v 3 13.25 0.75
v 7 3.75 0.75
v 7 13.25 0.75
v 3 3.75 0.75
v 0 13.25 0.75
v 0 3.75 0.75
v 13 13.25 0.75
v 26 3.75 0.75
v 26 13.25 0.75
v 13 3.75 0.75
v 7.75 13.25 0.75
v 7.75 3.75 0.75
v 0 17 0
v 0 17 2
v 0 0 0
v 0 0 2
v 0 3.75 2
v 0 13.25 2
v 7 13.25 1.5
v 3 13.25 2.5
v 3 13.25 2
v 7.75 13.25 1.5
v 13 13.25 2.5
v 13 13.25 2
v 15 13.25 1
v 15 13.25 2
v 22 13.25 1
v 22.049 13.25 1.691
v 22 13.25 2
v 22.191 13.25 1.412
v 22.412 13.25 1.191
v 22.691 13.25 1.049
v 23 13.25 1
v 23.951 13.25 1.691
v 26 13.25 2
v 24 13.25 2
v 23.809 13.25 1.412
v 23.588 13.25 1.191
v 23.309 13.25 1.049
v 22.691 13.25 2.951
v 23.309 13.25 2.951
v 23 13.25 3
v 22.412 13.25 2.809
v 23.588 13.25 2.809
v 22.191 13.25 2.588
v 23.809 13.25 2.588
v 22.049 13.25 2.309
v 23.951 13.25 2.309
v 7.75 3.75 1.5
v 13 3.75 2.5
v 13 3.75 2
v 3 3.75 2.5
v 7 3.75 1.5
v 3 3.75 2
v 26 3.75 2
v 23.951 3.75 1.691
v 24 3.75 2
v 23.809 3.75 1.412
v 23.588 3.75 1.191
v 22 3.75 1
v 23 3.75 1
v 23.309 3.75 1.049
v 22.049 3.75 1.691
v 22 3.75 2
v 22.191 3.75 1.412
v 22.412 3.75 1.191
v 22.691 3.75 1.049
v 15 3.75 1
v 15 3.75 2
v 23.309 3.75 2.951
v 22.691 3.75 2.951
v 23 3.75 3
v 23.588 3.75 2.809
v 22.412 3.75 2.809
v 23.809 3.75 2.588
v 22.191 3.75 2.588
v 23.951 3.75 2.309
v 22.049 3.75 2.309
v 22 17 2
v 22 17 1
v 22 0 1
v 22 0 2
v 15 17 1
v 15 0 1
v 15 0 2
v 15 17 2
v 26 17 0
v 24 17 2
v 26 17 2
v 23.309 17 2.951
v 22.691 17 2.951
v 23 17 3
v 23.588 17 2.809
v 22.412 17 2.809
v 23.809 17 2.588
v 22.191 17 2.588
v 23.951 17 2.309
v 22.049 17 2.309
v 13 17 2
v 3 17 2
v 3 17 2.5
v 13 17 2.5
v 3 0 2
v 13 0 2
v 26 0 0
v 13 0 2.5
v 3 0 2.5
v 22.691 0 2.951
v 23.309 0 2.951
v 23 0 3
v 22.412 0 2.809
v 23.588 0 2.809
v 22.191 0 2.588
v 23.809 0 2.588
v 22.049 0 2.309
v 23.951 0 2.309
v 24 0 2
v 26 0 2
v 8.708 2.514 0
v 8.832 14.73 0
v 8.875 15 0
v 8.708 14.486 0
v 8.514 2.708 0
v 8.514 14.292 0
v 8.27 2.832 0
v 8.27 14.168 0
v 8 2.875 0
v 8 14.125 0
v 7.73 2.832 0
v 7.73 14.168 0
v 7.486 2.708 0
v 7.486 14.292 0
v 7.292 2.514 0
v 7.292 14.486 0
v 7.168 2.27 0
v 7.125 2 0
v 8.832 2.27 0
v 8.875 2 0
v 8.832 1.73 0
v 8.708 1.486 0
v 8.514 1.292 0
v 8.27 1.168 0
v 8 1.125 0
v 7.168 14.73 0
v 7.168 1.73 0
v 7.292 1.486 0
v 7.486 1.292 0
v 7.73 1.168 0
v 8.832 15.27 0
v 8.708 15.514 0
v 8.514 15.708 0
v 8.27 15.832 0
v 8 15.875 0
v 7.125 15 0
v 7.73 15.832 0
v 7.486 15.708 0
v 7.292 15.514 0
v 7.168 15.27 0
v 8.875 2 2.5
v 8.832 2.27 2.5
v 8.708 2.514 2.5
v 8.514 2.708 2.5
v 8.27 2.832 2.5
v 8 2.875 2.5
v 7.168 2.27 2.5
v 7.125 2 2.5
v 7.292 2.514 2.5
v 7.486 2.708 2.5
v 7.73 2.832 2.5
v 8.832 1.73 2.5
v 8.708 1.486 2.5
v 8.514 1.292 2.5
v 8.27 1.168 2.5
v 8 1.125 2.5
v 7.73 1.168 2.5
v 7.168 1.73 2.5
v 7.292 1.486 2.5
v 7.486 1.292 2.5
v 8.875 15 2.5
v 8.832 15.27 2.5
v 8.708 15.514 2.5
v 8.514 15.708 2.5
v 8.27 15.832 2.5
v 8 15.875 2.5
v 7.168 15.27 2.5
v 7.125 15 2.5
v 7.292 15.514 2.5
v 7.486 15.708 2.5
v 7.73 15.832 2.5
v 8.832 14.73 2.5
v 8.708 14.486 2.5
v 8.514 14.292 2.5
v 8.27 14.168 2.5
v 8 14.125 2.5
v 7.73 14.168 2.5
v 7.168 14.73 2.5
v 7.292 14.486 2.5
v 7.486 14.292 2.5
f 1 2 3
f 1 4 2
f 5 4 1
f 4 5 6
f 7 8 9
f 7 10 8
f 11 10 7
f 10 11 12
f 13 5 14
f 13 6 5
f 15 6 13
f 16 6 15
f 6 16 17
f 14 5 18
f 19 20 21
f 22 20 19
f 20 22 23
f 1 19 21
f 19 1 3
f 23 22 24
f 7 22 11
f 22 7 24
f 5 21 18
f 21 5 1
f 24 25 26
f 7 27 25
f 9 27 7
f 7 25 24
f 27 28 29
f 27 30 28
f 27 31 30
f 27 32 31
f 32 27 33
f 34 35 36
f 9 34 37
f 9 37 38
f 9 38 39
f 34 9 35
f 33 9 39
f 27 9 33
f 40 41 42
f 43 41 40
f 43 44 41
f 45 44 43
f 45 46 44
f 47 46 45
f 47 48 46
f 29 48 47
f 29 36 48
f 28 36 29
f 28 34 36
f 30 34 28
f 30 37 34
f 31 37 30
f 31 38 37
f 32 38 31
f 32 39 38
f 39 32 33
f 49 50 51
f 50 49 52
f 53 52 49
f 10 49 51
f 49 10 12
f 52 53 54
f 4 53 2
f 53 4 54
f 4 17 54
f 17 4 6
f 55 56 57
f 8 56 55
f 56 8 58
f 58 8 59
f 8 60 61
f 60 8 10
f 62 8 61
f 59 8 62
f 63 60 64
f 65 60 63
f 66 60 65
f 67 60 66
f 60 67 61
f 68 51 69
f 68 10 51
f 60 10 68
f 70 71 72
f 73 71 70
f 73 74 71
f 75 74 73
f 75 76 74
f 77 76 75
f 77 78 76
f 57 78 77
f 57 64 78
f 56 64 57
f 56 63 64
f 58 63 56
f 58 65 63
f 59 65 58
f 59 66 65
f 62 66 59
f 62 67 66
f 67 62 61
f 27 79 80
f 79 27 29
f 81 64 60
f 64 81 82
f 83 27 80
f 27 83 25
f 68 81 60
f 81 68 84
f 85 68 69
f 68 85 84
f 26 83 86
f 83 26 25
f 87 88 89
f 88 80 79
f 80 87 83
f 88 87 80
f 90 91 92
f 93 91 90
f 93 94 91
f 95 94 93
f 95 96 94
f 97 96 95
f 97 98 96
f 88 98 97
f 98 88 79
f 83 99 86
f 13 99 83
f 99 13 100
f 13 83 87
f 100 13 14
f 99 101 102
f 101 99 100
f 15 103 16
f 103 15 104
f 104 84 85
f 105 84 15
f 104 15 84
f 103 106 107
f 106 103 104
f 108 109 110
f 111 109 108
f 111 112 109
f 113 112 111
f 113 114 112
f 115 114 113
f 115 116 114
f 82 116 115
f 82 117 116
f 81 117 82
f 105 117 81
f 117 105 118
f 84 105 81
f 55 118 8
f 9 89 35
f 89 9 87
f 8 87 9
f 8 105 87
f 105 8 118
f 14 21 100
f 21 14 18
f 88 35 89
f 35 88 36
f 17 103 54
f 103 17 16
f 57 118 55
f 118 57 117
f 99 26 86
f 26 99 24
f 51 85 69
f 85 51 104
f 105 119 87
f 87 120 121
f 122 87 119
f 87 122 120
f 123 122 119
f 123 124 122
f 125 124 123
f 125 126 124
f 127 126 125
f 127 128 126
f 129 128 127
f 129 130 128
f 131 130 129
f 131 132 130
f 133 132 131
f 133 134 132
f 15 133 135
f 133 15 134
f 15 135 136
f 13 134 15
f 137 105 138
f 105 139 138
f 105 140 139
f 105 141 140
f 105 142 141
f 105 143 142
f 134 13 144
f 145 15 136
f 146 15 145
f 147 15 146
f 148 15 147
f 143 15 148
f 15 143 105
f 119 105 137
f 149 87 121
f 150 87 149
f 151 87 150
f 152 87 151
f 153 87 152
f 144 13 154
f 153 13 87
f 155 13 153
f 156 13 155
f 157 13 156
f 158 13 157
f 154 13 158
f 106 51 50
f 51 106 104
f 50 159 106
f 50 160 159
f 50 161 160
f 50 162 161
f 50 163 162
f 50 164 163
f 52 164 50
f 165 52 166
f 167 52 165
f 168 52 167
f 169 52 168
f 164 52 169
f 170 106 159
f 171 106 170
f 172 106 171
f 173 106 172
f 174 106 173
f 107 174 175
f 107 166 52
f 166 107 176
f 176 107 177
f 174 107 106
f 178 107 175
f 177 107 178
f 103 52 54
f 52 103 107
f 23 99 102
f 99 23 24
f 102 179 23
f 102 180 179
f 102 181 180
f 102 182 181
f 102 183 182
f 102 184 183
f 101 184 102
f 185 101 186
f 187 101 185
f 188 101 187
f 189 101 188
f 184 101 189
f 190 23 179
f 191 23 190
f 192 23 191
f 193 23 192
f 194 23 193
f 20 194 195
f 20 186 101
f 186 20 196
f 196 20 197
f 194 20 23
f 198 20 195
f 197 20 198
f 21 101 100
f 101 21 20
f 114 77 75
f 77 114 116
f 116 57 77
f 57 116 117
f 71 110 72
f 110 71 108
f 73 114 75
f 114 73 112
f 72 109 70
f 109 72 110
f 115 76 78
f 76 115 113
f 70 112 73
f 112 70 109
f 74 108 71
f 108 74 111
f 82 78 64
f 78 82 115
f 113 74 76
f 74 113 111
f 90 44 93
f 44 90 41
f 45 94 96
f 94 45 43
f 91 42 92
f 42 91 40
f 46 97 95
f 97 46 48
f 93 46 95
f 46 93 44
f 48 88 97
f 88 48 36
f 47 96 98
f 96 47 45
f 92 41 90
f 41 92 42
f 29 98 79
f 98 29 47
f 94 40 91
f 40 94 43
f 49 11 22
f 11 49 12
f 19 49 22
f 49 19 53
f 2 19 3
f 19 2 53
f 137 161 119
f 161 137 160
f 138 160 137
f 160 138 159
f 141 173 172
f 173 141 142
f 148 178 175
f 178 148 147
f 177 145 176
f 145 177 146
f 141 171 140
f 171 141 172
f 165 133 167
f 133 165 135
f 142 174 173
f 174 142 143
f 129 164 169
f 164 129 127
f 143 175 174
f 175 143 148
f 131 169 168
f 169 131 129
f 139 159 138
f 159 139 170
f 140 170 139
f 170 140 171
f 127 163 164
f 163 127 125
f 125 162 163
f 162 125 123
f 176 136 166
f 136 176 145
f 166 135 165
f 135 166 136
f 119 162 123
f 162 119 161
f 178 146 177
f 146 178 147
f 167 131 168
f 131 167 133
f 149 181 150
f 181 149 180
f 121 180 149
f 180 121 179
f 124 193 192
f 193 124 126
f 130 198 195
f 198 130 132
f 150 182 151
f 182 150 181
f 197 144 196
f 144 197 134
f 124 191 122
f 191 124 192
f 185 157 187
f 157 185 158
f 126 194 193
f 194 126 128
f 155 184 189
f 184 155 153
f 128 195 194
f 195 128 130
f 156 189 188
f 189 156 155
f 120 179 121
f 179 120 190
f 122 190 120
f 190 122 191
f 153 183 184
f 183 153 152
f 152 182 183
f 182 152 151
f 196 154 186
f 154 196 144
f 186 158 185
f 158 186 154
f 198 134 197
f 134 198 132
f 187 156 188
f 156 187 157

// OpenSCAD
// In order to fit the backband, this piece needs to be cylindrically
// deformed before printing.
// I do this in MeshLab using
//  Filters->Smoothing, Fairing and Deformation->Geometric Function
// and then entering in z+sqrt(80^2-(x-35)^2)-80 for the z function

difference() {
    union() {
        difference() {
            cube([26,17,2]);
            union() {
                //strap track
                translate([0,3.75,0.75]) cube([48,9.5,3]);
                
                //flex gap
                translate([15,0,1]) cube([7,17,2]);
            }   
        }
        
        //mounting pads
        translate([3,0,0]) {
            cube([10,3.75,2.5]);
        }
        translate([3,13.25,0]) {
            cube([10,3.75,2.5]);
        }
        
        //flap flexers
        translate([23,3.75,2]) rotate([90,0,0]) cylinder(r=1, h=3.75,$fn = 20);
        translate([23,13.25,2]) rotate([-90,0,0]) cylinder(r=1, h=3.75,$fn = 20);
        
        //stopper
        translate([7,0,0.75]) cube([0.75,17,0.75]);
    }
    union() {
        //mounting posts
        translate([8,2,0]) {
            cylinder(r=0.875,h=6.5,$fn=20);
        }
        translate([8,15,0]) {
            cylinder(r=0.875,h=6.5,$fn=20);
        }
    }
}
